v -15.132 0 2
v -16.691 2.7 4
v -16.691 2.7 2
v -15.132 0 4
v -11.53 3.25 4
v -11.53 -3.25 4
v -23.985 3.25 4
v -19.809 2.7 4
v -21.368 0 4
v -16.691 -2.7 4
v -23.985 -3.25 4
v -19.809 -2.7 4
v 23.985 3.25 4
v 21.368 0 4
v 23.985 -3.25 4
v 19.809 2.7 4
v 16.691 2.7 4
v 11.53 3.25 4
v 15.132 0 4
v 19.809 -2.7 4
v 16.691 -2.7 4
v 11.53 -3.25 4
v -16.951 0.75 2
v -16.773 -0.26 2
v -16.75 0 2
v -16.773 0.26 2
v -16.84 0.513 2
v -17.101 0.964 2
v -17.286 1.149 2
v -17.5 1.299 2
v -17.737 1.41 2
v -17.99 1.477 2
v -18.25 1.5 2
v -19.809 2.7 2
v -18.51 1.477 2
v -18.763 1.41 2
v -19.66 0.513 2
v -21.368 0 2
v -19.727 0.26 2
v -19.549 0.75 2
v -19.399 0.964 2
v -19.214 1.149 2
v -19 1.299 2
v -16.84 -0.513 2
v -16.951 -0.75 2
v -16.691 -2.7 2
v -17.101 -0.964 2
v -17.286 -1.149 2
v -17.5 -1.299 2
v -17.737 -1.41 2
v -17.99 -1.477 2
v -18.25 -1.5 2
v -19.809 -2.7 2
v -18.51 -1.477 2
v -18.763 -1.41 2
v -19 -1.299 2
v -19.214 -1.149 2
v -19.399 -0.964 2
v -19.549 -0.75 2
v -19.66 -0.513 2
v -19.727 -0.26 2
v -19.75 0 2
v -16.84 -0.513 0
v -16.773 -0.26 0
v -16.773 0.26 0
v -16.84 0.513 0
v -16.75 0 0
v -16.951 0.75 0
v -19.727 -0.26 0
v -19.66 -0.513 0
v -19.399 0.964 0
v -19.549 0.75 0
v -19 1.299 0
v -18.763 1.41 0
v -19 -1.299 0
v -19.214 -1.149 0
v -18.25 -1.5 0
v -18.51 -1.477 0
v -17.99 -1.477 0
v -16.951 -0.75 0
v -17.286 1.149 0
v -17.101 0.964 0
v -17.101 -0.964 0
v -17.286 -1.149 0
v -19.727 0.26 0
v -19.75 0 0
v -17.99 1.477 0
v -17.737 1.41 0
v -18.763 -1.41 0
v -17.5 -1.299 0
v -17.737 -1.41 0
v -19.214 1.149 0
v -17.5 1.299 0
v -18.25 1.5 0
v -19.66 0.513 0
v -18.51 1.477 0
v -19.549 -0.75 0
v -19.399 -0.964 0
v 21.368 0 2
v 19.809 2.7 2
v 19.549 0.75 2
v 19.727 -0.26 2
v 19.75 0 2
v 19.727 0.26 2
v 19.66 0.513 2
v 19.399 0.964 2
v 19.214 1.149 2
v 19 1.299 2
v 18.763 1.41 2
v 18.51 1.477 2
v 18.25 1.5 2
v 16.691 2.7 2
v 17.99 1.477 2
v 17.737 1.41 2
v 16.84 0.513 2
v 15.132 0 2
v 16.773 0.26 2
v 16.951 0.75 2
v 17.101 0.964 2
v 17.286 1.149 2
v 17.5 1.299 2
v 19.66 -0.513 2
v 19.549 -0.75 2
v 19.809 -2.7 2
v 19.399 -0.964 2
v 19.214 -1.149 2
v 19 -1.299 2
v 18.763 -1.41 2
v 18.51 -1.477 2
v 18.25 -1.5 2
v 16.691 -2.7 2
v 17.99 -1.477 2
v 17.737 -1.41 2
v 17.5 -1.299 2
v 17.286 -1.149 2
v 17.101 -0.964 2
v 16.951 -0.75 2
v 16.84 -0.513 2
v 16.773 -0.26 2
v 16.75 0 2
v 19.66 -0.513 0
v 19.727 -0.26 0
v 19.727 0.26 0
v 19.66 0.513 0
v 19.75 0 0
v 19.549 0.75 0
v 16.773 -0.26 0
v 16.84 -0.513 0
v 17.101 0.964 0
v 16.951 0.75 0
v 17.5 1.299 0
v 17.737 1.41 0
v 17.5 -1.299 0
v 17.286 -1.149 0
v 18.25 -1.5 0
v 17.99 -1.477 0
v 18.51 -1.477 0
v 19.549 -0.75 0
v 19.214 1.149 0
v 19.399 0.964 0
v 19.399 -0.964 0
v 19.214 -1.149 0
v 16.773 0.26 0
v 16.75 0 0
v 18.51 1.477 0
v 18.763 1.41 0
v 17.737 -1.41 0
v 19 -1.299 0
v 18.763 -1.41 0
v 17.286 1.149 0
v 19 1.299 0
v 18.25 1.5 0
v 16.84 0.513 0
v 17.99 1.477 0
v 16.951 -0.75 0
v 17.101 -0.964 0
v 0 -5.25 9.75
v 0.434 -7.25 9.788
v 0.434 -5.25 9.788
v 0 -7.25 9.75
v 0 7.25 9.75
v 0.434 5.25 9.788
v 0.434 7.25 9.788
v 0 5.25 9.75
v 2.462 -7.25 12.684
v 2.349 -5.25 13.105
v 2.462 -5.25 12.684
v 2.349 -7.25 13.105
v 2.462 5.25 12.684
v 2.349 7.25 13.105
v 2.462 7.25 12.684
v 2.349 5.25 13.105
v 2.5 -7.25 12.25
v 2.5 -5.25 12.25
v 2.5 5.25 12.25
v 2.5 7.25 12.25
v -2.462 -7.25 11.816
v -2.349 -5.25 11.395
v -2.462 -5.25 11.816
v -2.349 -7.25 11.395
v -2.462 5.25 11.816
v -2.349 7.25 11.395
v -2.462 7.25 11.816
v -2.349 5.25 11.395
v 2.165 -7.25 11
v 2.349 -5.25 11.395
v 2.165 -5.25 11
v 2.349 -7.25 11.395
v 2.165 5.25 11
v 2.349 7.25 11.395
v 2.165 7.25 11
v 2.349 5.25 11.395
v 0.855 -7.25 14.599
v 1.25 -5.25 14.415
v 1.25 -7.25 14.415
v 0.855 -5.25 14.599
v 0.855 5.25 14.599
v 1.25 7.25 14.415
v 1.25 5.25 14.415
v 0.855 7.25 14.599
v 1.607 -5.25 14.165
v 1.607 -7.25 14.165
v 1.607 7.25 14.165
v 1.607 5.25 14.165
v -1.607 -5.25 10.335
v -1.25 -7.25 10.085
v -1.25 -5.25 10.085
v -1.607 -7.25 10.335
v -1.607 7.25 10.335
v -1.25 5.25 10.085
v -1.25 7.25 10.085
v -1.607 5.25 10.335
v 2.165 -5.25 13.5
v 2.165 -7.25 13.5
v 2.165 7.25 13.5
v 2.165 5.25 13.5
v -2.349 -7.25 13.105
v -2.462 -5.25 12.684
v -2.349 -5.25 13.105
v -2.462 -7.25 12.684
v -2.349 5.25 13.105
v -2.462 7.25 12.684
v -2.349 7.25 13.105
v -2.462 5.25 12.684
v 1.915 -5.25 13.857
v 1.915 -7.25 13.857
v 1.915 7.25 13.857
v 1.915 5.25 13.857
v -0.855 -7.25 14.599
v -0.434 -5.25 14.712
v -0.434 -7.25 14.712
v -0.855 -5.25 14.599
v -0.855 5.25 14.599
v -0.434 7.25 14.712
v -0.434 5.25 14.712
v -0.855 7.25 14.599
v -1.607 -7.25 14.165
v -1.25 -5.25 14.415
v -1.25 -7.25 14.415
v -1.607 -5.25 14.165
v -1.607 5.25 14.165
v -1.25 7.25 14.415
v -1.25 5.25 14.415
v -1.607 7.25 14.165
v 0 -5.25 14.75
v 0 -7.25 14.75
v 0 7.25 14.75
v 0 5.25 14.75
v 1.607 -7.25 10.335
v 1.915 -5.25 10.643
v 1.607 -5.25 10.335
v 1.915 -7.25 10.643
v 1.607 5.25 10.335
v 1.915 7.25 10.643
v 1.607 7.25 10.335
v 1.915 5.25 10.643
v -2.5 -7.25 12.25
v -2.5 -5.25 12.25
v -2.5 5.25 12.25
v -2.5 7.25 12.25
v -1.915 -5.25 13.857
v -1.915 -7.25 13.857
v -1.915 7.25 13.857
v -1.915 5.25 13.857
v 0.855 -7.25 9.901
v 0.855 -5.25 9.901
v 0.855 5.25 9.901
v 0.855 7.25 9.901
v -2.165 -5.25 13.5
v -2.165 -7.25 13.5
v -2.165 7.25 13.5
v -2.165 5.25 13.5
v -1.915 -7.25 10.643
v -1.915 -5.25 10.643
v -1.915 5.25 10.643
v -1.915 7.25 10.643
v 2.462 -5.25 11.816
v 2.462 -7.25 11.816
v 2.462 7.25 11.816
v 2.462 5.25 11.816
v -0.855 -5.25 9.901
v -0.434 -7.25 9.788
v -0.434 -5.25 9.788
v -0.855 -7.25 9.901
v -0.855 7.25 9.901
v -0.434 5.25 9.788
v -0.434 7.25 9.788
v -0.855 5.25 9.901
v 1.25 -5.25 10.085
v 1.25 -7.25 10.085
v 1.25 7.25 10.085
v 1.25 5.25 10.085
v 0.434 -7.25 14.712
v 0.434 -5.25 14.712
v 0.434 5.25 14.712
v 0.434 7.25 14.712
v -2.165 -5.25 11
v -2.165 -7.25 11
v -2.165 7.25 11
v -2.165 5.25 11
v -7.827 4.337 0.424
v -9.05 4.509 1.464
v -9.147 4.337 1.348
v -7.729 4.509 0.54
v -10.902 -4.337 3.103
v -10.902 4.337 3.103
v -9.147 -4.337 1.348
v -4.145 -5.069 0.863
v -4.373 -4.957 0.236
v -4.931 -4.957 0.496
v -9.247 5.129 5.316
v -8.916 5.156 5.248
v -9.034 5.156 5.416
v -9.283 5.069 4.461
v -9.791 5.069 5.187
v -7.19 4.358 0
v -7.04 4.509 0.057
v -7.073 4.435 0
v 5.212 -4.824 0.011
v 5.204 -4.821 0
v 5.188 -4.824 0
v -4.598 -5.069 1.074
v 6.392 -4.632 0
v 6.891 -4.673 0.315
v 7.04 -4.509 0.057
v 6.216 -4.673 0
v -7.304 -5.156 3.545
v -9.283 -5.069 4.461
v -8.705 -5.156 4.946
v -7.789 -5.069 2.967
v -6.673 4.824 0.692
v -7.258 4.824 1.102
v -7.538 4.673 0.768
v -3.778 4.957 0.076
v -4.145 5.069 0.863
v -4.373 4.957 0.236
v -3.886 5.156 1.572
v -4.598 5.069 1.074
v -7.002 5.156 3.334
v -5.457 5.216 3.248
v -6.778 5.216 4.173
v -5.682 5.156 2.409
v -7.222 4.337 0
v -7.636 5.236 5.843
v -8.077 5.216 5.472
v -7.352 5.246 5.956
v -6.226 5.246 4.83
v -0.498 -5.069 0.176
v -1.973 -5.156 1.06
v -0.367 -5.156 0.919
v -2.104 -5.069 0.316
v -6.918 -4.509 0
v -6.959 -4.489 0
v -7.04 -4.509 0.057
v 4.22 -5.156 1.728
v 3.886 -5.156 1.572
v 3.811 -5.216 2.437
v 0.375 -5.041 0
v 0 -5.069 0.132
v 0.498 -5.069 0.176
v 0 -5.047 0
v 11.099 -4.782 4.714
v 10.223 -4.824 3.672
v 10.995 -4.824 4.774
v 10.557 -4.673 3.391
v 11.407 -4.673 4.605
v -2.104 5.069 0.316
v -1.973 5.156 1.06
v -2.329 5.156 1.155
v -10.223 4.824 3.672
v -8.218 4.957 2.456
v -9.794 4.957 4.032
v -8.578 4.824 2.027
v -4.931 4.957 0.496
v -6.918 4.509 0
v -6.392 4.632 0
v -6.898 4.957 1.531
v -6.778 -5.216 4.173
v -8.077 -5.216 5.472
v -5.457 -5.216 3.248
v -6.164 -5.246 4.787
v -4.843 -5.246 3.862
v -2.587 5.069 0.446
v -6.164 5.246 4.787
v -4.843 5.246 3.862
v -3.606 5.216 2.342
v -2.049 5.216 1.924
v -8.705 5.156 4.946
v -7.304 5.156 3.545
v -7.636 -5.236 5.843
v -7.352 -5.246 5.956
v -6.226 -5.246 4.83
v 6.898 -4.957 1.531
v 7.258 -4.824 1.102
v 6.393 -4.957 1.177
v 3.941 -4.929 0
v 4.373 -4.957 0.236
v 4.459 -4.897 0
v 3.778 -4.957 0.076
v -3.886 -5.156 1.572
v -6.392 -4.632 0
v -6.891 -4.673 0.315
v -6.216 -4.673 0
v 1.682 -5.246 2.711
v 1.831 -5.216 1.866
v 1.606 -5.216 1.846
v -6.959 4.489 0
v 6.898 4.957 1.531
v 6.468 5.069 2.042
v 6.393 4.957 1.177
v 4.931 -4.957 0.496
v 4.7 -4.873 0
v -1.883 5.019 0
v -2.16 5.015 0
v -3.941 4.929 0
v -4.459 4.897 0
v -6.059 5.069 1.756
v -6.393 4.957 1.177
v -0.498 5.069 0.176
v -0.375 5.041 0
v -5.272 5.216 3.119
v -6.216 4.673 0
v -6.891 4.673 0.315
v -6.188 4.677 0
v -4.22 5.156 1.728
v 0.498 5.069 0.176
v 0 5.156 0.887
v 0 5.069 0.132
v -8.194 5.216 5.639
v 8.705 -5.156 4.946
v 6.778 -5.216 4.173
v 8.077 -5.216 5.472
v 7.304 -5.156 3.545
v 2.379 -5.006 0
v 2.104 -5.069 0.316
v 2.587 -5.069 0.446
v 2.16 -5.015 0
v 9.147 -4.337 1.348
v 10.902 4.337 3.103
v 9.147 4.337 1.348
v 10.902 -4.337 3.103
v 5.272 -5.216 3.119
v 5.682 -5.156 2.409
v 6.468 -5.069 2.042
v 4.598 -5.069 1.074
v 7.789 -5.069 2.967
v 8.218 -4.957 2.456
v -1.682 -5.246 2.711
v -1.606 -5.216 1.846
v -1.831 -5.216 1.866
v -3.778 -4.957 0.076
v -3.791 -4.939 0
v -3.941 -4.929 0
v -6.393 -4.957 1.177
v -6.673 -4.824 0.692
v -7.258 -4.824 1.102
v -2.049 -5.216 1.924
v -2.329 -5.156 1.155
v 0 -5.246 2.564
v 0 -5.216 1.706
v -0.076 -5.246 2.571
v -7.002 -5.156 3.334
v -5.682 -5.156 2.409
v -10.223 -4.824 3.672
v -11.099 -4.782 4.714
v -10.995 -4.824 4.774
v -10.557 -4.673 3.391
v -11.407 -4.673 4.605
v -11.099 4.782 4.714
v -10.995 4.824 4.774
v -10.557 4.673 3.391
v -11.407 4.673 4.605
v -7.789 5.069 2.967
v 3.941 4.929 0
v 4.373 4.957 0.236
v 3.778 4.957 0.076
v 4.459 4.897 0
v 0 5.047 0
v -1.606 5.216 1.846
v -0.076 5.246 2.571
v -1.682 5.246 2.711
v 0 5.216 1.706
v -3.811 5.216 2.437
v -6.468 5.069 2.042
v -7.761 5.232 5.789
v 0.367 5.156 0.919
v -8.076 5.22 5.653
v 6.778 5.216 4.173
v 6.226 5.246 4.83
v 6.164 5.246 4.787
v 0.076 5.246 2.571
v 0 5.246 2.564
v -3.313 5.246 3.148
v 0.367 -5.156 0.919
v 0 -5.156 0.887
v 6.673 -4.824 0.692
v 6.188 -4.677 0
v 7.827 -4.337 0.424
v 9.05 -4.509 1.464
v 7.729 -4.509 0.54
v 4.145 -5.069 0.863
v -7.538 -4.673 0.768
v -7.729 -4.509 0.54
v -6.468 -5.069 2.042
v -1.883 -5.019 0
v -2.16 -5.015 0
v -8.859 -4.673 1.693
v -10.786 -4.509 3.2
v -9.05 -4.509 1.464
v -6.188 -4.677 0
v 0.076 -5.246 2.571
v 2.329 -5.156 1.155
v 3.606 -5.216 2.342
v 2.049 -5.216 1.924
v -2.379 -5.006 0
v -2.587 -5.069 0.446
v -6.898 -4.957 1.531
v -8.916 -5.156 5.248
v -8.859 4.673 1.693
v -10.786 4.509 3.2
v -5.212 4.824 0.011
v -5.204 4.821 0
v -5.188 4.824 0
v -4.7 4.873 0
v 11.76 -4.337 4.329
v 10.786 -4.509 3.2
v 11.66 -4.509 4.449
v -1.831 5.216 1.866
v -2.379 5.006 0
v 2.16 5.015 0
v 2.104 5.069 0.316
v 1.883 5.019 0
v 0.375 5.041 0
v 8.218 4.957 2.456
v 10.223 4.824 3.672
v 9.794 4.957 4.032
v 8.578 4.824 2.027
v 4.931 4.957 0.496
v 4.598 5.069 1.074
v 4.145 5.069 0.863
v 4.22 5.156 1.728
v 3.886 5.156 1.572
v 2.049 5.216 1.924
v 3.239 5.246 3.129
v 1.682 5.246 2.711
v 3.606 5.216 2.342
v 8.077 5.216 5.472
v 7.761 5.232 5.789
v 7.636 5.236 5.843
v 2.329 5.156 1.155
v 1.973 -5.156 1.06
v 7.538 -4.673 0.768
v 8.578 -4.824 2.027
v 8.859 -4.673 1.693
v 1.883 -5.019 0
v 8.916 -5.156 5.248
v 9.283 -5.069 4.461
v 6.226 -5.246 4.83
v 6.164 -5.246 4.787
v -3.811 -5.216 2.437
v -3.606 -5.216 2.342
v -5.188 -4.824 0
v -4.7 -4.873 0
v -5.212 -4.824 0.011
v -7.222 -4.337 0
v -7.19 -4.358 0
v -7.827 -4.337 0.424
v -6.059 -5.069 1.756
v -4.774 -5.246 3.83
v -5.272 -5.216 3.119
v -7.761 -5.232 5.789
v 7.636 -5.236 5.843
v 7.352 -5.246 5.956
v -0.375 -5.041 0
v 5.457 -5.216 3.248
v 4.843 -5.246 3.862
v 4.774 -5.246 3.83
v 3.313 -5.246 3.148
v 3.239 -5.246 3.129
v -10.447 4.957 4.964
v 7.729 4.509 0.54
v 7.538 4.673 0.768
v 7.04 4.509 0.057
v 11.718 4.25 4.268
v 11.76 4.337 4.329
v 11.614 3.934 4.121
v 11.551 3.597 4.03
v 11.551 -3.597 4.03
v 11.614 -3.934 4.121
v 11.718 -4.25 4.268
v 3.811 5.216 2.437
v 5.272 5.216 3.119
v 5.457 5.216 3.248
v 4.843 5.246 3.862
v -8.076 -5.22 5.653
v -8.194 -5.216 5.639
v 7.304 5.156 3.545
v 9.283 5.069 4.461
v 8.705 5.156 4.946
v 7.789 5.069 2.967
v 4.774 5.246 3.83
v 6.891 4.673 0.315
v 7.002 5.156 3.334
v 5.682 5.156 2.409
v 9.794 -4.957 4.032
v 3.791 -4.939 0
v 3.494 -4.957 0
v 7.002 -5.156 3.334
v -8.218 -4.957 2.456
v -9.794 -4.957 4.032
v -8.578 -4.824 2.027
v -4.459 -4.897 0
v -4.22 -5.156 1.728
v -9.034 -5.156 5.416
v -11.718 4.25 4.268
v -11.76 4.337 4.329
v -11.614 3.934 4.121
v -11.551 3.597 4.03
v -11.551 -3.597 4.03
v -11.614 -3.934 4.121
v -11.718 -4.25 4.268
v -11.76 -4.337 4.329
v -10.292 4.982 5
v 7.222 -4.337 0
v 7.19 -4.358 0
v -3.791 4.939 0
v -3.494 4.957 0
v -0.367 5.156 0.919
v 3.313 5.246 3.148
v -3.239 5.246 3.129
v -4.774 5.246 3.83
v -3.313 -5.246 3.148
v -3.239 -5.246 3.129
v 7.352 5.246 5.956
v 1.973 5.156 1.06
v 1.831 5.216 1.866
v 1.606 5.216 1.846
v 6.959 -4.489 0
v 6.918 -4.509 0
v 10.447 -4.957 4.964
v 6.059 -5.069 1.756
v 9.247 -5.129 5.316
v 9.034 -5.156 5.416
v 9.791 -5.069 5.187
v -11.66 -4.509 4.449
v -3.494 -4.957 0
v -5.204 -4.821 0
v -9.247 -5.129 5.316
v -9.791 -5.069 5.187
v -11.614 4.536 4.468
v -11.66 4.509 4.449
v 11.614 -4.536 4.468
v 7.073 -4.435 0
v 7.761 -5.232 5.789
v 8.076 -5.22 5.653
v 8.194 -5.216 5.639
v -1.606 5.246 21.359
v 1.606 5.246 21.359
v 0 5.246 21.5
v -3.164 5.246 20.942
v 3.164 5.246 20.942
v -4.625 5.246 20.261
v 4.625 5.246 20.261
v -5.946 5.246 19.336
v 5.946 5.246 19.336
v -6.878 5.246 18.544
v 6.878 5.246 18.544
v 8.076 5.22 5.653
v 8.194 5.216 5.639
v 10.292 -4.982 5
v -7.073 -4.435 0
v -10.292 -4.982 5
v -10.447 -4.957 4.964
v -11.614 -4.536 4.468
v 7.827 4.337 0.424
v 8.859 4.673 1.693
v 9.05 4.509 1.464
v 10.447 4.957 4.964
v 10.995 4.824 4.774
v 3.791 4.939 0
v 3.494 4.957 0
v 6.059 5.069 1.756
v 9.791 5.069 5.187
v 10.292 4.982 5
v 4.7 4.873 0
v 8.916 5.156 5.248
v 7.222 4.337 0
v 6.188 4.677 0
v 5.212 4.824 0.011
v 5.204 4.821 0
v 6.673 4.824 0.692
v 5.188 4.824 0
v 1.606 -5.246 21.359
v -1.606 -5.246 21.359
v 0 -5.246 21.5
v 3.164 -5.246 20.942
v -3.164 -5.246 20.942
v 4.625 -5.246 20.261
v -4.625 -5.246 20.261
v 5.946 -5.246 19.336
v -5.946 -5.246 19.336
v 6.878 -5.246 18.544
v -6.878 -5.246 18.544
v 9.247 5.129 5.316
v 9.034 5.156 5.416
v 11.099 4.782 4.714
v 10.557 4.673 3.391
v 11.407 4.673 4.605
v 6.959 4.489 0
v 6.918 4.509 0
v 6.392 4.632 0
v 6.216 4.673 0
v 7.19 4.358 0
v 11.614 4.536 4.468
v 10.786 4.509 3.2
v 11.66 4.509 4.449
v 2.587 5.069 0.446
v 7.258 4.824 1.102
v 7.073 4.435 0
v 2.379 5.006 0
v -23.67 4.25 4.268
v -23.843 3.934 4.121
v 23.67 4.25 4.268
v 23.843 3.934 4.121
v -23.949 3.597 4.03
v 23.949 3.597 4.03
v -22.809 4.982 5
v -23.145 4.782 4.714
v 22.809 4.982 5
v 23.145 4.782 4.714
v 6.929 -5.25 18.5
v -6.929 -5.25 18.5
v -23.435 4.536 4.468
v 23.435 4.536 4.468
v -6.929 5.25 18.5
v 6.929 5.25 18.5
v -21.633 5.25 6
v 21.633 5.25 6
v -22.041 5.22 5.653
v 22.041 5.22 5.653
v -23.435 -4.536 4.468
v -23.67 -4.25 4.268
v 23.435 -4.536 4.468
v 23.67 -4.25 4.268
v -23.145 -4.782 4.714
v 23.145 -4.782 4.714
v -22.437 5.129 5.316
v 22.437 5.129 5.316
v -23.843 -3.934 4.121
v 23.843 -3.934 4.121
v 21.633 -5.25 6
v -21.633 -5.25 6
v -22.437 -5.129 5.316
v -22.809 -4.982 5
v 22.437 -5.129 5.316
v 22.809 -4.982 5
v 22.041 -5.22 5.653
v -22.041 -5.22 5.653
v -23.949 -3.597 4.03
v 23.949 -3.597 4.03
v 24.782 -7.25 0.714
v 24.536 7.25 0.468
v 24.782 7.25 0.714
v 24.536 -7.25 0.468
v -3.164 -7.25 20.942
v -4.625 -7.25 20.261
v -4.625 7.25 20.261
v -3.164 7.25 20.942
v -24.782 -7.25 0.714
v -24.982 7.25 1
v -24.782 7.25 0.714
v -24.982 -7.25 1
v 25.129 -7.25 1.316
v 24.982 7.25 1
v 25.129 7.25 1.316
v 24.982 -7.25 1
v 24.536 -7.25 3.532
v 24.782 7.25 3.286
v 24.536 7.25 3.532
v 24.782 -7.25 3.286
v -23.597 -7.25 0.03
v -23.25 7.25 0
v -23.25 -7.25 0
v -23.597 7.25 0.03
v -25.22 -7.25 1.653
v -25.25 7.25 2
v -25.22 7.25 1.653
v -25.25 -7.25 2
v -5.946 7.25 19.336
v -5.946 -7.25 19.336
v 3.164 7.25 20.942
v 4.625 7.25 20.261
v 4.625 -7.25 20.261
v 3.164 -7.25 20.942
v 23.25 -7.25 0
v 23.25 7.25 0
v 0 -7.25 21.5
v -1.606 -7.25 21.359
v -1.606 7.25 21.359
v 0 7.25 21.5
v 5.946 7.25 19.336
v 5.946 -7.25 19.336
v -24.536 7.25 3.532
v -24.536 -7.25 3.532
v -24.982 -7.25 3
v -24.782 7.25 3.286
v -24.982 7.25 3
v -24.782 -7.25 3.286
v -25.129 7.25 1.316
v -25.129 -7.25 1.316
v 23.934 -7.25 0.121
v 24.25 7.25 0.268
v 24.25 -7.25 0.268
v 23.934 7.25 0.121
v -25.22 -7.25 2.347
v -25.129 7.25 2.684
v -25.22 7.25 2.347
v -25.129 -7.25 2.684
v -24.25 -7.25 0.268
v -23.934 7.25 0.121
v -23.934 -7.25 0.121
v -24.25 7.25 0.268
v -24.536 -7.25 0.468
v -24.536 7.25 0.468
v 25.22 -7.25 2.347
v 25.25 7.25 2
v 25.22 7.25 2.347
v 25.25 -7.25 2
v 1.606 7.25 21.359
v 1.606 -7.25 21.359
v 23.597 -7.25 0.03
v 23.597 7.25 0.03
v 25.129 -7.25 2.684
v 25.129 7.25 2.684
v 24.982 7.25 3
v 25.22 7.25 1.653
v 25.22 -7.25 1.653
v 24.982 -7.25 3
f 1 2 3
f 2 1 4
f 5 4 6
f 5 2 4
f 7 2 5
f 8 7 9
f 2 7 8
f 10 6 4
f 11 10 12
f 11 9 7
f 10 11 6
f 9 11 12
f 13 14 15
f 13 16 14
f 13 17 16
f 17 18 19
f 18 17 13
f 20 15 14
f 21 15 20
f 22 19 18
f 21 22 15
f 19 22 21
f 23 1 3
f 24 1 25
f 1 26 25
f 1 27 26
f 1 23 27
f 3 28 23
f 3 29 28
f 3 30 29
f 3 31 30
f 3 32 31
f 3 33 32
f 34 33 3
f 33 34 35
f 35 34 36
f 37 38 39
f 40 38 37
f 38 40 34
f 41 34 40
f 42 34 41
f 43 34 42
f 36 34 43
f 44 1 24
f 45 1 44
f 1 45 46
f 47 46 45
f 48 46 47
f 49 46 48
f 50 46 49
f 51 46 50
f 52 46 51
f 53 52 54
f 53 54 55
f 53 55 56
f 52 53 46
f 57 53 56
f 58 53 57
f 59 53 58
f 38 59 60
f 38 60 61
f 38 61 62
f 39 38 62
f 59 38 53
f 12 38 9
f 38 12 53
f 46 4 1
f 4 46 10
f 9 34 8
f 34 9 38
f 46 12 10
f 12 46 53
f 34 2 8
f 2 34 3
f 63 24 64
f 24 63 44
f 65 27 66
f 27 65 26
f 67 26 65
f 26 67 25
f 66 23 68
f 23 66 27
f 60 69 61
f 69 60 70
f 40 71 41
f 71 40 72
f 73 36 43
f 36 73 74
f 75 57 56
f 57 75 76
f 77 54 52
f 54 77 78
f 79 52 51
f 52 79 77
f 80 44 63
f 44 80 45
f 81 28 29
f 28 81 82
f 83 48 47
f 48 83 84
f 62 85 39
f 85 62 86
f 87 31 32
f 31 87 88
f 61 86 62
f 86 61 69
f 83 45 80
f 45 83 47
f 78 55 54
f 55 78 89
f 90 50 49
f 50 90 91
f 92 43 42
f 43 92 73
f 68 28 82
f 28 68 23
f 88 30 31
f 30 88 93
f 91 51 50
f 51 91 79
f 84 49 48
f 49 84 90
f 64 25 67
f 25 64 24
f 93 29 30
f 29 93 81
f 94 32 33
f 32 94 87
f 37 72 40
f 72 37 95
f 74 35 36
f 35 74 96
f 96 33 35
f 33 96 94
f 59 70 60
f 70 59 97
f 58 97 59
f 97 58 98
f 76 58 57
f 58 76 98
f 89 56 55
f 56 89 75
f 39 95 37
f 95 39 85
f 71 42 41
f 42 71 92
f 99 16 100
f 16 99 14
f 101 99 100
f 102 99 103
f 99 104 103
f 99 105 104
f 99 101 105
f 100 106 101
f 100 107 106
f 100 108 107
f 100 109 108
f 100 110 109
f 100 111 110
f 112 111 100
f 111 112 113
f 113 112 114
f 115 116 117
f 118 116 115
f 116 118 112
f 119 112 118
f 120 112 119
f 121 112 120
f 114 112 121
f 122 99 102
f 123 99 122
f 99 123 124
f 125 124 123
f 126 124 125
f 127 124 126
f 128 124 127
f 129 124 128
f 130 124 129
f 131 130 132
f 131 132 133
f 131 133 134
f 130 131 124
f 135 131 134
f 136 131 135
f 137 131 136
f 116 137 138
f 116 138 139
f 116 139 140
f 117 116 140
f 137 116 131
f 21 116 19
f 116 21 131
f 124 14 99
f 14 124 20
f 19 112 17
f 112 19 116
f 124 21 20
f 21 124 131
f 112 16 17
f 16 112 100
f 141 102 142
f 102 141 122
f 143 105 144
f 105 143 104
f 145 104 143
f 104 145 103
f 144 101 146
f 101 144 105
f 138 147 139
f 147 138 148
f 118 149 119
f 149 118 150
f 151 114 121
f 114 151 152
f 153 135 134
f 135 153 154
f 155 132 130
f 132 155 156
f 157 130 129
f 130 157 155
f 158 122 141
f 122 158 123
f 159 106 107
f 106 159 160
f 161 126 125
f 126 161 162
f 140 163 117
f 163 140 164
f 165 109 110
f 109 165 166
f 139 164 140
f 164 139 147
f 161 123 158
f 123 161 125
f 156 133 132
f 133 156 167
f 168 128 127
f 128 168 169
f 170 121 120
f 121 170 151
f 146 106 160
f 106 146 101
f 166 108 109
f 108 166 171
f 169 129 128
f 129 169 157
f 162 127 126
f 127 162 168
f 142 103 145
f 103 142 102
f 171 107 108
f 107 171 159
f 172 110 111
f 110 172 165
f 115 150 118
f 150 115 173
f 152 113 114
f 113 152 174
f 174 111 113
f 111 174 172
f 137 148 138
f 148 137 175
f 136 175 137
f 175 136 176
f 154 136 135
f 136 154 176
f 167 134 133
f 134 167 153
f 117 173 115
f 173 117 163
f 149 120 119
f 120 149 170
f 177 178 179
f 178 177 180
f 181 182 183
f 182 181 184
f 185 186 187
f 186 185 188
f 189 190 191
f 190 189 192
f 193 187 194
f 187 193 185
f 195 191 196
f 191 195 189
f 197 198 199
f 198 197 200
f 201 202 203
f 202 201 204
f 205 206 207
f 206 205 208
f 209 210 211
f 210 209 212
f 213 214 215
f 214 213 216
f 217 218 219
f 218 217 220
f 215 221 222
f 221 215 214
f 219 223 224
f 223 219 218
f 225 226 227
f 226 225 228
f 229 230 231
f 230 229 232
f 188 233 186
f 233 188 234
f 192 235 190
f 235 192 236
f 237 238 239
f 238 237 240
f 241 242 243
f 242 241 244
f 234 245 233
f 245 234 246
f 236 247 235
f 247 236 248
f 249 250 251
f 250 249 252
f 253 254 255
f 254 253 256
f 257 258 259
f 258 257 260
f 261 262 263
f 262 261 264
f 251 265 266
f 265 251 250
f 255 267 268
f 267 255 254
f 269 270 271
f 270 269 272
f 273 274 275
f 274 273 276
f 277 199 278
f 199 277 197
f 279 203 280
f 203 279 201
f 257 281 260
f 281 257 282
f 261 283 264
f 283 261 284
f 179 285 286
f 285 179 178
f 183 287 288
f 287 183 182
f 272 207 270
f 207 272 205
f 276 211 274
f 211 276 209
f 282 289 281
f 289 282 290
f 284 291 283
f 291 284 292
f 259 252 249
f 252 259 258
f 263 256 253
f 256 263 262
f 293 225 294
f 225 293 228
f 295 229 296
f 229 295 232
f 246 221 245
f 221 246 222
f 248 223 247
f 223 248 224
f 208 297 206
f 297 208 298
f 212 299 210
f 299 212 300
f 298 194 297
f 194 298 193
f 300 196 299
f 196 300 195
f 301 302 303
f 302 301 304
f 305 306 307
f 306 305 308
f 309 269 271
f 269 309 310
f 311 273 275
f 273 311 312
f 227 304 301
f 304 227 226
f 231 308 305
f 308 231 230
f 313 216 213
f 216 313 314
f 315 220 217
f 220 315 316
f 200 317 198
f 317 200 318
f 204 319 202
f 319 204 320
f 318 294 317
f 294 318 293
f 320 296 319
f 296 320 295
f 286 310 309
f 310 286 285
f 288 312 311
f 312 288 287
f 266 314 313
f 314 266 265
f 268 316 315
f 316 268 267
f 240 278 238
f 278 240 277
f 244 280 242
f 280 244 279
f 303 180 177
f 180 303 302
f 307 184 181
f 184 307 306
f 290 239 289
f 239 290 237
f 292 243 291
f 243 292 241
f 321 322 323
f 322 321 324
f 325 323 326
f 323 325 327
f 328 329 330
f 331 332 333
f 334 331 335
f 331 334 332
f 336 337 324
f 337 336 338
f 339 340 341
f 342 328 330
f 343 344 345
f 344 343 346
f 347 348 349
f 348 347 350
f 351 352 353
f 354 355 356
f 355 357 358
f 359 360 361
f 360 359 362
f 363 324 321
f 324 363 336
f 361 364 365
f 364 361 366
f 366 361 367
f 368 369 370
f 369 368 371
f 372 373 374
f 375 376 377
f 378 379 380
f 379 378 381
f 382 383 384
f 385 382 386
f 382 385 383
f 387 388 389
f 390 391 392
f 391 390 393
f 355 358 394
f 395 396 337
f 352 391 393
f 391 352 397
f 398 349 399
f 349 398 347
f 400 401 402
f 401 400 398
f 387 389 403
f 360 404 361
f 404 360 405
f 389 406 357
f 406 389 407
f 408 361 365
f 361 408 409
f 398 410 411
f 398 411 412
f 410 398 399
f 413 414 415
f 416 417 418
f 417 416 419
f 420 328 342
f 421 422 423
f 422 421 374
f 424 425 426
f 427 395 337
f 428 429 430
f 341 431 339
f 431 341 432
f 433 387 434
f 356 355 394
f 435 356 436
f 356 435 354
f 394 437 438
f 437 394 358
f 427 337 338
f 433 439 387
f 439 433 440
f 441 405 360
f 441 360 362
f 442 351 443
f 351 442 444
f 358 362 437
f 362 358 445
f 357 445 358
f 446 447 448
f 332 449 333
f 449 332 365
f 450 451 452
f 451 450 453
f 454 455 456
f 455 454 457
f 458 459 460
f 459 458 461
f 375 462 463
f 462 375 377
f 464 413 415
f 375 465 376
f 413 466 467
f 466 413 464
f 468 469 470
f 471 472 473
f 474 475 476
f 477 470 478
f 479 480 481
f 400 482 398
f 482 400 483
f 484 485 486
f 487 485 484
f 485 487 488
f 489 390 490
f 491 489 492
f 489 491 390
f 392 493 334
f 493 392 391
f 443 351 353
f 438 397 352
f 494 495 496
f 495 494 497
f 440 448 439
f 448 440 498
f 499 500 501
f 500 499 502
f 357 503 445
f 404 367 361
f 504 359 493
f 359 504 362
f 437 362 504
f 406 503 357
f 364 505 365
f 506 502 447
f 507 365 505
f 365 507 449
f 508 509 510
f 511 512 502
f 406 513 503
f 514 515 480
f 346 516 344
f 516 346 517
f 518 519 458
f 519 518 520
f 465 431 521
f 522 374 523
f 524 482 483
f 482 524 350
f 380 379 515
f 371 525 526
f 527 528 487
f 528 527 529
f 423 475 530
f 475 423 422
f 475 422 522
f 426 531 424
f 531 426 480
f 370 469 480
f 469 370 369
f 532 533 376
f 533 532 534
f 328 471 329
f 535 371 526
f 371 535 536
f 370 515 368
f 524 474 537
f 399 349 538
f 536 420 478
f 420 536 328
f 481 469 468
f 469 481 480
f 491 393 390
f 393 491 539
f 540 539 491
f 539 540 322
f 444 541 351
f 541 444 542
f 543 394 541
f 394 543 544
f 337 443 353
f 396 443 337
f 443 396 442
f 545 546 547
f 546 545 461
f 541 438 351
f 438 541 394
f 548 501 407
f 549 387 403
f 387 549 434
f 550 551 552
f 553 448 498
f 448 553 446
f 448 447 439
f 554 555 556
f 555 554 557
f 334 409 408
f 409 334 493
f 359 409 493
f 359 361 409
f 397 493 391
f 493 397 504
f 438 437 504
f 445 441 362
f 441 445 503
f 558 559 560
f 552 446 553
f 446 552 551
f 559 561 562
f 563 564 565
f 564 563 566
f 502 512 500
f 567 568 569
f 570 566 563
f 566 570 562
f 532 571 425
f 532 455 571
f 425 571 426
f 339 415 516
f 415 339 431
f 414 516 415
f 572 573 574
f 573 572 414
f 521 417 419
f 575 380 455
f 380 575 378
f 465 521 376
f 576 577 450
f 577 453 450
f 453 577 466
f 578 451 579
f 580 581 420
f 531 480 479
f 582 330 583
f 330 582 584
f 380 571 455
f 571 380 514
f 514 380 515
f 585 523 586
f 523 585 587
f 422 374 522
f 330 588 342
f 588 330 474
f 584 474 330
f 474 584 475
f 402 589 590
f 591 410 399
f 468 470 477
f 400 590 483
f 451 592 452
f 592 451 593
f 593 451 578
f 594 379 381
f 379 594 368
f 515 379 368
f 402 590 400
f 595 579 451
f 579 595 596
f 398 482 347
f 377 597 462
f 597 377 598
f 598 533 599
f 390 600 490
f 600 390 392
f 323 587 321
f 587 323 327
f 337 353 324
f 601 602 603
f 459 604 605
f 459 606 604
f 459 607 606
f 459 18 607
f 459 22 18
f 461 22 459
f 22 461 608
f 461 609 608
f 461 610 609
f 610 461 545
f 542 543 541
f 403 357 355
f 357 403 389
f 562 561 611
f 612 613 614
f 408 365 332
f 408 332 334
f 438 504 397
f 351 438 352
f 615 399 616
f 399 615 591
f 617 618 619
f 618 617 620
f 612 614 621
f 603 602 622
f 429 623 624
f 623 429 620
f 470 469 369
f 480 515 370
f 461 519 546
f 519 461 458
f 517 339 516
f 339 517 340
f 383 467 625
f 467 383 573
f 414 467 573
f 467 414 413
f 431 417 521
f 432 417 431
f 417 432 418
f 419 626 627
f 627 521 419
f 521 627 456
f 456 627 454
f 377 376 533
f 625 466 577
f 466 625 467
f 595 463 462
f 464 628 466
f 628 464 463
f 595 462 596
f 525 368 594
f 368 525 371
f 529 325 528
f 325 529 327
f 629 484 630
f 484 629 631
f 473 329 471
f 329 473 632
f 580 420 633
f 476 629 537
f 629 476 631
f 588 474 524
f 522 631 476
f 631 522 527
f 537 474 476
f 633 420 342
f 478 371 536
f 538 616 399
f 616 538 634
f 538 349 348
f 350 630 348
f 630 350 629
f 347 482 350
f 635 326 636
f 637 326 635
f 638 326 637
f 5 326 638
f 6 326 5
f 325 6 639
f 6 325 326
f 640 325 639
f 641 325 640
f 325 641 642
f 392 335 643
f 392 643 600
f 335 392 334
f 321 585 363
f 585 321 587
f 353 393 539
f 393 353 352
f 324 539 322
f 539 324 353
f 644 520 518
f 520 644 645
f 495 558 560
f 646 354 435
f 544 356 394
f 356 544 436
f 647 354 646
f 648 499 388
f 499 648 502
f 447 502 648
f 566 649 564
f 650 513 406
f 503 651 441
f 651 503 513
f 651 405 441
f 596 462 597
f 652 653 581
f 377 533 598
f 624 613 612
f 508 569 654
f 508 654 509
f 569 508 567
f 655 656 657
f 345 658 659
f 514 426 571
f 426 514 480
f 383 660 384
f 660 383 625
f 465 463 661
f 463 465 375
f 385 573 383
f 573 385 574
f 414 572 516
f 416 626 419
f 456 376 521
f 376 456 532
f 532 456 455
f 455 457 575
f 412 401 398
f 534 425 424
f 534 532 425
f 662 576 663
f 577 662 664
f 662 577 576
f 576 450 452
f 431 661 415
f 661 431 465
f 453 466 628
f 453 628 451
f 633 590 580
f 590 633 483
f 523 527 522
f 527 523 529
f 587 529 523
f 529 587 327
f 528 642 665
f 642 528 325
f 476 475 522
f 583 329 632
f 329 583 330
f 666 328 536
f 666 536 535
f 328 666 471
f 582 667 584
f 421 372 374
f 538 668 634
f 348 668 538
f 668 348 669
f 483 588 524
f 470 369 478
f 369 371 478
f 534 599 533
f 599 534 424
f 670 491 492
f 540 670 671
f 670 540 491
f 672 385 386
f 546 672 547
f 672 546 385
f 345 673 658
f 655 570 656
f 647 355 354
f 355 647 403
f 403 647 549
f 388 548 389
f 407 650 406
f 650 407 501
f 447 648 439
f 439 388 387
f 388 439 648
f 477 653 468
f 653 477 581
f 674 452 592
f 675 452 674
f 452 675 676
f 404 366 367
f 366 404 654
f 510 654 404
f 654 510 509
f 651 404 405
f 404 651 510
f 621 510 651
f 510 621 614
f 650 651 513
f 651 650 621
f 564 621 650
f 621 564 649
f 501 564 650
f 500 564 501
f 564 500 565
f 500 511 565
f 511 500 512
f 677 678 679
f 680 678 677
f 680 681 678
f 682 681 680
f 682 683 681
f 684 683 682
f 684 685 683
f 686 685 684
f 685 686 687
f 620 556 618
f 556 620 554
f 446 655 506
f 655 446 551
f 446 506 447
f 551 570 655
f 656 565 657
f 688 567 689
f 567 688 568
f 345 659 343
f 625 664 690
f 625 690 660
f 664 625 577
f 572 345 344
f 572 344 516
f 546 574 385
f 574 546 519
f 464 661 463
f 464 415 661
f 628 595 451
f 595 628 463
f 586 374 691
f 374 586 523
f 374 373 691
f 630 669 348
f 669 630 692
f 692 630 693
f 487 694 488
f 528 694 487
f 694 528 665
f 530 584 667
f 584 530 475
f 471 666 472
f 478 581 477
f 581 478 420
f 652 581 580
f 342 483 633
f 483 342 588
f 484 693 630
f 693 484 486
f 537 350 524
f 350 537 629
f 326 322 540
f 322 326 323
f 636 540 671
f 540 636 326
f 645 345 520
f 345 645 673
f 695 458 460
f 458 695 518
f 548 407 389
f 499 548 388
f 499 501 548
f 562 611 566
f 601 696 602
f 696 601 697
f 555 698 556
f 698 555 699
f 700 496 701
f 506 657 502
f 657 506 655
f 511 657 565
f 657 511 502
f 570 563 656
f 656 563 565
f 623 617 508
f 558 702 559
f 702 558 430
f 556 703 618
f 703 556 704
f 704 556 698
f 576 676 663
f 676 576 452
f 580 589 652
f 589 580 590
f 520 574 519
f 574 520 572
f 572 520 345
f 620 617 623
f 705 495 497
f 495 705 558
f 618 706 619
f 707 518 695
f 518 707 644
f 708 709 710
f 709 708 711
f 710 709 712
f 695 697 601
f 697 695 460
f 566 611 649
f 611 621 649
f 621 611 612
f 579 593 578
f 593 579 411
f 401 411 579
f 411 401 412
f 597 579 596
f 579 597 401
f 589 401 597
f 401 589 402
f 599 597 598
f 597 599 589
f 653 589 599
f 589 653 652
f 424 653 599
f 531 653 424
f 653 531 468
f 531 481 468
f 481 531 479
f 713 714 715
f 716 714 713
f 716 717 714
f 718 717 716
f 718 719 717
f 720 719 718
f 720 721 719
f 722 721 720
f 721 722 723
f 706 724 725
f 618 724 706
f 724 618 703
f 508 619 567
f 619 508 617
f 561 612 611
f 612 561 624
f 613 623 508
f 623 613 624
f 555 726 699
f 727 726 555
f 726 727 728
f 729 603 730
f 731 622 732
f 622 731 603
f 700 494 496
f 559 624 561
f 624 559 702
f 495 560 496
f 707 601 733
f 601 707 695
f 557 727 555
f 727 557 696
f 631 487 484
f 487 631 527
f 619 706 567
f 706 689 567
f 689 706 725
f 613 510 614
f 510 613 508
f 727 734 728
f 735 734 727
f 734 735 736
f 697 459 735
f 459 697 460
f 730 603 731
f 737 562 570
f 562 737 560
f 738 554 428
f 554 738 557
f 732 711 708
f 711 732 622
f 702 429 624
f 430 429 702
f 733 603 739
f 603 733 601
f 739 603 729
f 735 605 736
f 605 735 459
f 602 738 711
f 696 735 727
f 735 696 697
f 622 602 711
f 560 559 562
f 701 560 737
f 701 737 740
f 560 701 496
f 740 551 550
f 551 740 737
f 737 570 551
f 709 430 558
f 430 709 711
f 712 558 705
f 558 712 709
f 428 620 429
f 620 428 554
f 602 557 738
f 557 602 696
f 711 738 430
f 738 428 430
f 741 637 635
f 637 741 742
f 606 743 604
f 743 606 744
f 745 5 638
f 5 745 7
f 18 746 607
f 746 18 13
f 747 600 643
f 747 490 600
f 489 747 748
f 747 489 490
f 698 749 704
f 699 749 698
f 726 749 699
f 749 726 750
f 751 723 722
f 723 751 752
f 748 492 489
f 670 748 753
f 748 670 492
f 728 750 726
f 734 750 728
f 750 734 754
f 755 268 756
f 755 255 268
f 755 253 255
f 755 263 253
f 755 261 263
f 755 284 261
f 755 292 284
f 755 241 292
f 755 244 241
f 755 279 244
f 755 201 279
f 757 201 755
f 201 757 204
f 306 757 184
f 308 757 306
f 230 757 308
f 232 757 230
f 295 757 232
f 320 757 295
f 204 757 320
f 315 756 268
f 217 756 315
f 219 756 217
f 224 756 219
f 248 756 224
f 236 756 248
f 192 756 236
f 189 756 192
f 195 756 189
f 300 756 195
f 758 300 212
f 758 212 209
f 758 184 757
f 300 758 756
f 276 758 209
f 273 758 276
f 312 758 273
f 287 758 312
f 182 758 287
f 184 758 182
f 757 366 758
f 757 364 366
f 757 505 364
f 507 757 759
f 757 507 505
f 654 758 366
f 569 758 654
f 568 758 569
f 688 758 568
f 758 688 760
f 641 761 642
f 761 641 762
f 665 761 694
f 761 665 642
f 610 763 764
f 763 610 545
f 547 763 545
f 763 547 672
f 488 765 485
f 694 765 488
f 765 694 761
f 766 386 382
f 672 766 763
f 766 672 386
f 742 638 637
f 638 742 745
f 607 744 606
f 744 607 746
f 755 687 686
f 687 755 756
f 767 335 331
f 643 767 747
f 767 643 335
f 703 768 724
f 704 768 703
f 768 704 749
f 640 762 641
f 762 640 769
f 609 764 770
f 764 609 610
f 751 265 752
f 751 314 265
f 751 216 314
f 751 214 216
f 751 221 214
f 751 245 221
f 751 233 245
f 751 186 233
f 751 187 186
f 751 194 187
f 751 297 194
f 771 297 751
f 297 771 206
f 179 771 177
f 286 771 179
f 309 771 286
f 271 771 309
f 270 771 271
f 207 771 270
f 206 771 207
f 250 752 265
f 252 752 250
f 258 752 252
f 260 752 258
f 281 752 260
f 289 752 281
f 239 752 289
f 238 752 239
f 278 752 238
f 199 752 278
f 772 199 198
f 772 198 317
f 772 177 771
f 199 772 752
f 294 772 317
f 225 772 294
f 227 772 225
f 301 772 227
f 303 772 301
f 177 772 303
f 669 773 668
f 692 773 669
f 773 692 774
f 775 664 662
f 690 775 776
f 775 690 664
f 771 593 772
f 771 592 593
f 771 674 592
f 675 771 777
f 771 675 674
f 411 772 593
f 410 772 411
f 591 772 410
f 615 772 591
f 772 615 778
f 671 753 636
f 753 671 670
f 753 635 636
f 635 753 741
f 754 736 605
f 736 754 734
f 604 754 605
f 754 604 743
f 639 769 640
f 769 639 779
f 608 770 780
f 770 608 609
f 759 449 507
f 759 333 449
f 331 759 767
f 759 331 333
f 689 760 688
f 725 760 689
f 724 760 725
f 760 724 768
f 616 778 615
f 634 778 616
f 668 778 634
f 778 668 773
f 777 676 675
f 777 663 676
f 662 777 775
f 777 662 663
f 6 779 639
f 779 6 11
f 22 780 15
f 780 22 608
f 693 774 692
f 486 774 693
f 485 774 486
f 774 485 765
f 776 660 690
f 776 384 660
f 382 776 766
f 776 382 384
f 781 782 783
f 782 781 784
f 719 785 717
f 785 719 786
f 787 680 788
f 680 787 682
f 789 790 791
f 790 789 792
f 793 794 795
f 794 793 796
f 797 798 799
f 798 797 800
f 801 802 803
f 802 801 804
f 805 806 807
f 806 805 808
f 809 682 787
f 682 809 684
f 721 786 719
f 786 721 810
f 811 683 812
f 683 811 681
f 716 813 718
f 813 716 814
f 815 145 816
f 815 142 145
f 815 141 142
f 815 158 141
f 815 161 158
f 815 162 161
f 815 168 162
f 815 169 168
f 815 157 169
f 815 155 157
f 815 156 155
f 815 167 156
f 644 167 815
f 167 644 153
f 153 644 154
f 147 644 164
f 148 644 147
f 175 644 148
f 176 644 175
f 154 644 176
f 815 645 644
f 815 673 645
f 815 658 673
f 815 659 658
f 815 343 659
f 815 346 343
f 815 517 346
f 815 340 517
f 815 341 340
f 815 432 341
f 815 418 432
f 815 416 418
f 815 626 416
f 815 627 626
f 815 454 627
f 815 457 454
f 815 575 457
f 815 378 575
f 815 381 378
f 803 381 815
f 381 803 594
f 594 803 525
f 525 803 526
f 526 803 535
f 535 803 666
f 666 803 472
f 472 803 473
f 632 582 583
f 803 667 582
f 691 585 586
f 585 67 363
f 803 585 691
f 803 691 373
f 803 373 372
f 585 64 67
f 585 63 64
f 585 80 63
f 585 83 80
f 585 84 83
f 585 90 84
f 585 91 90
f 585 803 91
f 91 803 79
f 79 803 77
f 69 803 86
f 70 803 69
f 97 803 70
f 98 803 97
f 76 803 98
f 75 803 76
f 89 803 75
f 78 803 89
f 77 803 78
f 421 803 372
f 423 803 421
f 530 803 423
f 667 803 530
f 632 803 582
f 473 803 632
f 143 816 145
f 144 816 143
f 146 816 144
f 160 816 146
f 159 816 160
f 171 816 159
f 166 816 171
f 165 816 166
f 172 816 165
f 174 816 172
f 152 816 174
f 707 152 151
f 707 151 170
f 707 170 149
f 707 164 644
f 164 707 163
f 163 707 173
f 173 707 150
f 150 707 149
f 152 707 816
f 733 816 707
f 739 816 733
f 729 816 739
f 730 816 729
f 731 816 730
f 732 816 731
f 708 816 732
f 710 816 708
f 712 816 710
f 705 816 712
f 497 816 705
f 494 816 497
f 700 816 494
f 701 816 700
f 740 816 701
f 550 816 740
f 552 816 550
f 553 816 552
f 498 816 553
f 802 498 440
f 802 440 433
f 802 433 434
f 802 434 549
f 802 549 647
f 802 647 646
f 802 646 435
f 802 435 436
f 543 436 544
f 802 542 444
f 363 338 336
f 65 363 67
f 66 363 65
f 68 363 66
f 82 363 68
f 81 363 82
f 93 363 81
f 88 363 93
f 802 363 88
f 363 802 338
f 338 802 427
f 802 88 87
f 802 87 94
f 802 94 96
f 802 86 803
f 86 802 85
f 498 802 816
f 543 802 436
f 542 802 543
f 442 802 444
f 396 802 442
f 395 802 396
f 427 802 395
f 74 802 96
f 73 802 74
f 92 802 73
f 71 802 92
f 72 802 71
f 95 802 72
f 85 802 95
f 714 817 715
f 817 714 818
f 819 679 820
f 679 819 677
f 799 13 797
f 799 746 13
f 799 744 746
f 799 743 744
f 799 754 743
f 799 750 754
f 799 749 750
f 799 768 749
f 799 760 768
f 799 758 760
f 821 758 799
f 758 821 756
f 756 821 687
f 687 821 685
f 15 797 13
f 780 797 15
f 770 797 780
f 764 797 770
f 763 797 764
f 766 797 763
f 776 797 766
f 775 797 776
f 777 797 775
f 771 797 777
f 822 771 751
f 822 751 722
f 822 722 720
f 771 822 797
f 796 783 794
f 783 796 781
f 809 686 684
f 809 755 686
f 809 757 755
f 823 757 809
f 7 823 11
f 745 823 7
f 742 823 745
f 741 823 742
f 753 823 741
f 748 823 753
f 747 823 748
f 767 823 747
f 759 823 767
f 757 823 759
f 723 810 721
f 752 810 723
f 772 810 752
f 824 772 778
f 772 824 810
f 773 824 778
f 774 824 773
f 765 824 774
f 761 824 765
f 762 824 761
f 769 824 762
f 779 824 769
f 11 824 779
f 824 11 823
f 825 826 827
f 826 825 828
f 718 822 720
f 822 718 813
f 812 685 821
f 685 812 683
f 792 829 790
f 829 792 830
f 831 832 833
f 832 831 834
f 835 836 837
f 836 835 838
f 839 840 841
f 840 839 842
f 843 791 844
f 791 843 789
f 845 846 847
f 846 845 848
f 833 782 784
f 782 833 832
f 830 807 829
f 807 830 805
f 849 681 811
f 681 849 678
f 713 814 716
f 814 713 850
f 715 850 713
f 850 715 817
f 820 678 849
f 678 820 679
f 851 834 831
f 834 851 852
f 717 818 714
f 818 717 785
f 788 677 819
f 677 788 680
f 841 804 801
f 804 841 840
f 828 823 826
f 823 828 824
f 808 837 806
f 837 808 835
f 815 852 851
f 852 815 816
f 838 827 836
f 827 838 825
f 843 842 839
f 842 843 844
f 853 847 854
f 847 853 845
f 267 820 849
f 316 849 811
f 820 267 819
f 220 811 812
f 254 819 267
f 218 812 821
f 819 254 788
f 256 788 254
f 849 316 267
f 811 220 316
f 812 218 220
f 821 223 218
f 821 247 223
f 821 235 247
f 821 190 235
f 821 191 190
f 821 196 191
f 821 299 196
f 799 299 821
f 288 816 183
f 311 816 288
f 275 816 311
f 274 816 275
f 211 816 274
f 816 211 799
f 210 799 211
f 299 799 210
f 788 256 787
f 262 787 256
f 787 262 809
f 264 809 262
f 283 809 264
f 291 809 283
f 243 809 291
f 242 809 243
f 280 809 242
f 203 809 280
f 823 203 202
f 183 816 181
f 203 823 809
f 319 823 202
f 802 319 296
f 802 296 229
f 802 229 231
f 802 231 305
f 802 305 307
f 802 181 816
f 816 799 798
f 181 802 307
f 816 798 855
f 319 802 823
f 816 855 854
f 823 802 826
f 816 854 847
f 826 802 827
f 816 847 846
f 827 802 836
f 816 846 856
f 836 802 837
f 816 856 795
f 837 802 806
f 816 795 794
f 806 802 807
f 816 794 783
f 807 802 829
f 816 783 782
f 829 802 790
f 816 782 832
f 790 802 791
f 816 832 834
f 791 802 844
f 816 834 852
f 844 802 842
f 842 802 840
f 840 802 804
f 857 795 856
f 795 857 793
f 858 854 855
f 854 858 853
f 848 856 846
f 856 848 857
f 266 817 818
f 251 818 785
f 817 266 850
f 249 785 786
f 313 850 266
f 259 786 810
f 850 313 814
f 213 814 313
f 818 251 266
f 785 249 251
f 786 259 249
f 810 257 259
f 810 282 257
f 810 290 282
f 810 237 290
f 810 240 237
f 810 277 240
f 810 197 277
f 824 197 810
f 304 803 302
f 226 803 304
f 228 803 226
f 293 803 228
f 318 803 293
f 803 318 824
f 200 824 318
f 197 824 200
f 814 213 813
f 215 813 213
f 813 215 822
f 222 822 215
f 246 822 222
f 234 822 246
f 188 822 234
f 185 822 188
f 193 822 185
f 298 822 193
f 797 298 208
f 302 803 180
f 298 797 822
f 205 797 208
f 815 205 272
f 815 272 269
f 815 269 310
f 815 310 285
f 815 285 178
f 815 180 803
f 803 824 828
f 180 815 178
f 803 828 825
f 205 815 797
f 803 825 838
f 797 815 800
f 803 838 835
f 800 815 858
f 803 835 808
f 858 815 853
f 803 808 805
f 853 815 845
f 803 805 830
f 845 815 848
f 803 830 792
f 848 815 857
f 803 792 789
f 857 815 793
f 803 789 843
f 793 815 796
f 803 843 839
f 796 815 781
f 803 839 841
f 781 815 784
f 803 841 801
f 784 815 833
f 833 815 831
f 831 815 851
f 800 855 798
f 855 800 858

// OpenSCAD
// file: rounded_cube.scad
module rounded_cube(size = [ 1, 1, 1 ], center = false, r = 0.5) {
	// if single value, convert to [x, y, z] vector
	size = (size[0] == undef) ? [size, size, size] : size;

	translate = (center == false) ?
		[ r, r, r ] :
		[
			r - (size[0] / 2),
			r - (size[1] / 2),
			r - (size[2] / 2)
        ];

	translate(translate)
	minkowski() {
		cube(size = [
			size[0] - (r * 2),
			size[1] - (r * 2),
			size[2] - (r * 2)
		]);
		sphere(r);
	}
}


module rounded_column(size = [1, 1, 1], center = false, r = 0.5) {
	// if single value, convert to [x, y, z] vector
	size = (size[0] == undef) ? [size, size, size] : size;

    x = size[0] - 2*r;
    y = size[1] - 2*r;
    h = size[2];
    
	translate = (center == false) ?
		[ r, r, 0 ] :
		[
			r - (size[0] / 2),
			r - (size[1] / 2),
			  - h / 2
        ];

	translate(translate)
    hull() {
		translate([ 0, 0, 0 ]) cylinder(r=r, h);
		translate([ x, 0, 0 ]) cylinder(r=r, h);
		translate([ 0, y, 0 ]) cylinder(r=r, h);
		translate([ x, y, 0 ]) cylinder(r=r, h);
	}
}

rounded_cube(20, r=4, center=true);
// main file
use <rounded_cube.scad>

$fn = 36;

GT2D = 18.5;    // puller diameter
GT2W = 8.5;     // puller width
GT2d = 5;       // pulley axis diameter
GT2g = 1.0;     // pulley gap
thickness = 2;  // wall thickness

dScrews = 36.5; // distance between screws
dScrew = 3;     // screw diameter
dNut = 5.4;     // nut diameter (between faces)
hNut = 2;       // nut height

module outer_hull(L = dScrews+10, l = 8, 
    w = GT2W + 2 * GT2g + 2*thickness, 
    h = GT2D + 2 * GT2g , 
    r = thickness)
{
    l = l - 2*r;
    
    hull()
    {
        translate([ -L/2, 0, -h/2 ])
        rotate([ 90, 0, 0 ])
        cylinder(h=w, r=r, center=true);

        translate([ +L/2, 0, -h/2 ])
        rotate([ 90, 0, 0 ])
        cylinder(h=w, r=r, center=true);

        rotate([ 90, 0, 0 ])
        cylinder(h=w, r=GT2D/2, center=true);

        /*
        translate([ -l/2, 0, h/2 ])
        rotate([ 90, 0, 0 ])
        cylinder(h=w, r=r, center=true);

        translate([ +l/2, 0, h/2 ])
        rotate([ 90, 0, 0 ])
        cylinder(h=w, r=r, center=true);
        */
    }
}

module inner_space(
    r = 2*GT2g) 
{
    hMult = 5;
    
    rotate([ 90, 0, 0 ])
    minkowski() {
        cylinder(r = GT2D/2, h = GT2W, center=true);
        scale([ hMult, hMult, 1 ]) 
            sphere(r = GT2g);
    }
    
    h = GT2D + 2 * GT2g - 2 * hNut;
    w = GT2W + 2 * GT2g; 

    rotate([ 0, 90, 0 ])
    rounded_column([ h, w, 99 ], center=true, r=2);
}

module screws_holes(rAxis=GT2d/2) 
{
    // screws
    
    translate([ -dScrews/2, 0, -GT2D/2])
    nut();
    
    translate([ +dScrews/2, 0, -GT2D/2 ])
    nut();
    
    // ball bearing axis
    
    rotate([ 90, 0, 0 ])
    cylinder(h=99, r=rAxis, center=true);    
}

module nut(dScrew = 3, dNut = 5.4, hNut = 2)
{
    union() {
        rotate([ 0, 0, 30 ]) 
        intersection() {
            rotate([ 0, 0,  0  ]) cube([ dNut, 5*dNut, hNut ], center=true);
            rotate([ 0, 0, 120 ]) cube([ dNut, 5*dNut, hNut ], center=true);
            rotate([ 0, 0, 240 ]) cube([ dNut, 5*dNut, hNut ], center=true);
        }
        
        rScrew = 1.8;
        cylinder(h=99, r=dScrew/2, center=true);
    }
}

translate([ 0, 0, GT2D/2+GT2g+thickness ])
{
    difference() {
        outer_hull();
        screws_holes();
        inner_space();
    }

    // if (false) 
    {
        rotate([ 90, 0, 0 ])
        %cylinder(r=GT2D/2, h=GT2W, center=true);
    }
}
